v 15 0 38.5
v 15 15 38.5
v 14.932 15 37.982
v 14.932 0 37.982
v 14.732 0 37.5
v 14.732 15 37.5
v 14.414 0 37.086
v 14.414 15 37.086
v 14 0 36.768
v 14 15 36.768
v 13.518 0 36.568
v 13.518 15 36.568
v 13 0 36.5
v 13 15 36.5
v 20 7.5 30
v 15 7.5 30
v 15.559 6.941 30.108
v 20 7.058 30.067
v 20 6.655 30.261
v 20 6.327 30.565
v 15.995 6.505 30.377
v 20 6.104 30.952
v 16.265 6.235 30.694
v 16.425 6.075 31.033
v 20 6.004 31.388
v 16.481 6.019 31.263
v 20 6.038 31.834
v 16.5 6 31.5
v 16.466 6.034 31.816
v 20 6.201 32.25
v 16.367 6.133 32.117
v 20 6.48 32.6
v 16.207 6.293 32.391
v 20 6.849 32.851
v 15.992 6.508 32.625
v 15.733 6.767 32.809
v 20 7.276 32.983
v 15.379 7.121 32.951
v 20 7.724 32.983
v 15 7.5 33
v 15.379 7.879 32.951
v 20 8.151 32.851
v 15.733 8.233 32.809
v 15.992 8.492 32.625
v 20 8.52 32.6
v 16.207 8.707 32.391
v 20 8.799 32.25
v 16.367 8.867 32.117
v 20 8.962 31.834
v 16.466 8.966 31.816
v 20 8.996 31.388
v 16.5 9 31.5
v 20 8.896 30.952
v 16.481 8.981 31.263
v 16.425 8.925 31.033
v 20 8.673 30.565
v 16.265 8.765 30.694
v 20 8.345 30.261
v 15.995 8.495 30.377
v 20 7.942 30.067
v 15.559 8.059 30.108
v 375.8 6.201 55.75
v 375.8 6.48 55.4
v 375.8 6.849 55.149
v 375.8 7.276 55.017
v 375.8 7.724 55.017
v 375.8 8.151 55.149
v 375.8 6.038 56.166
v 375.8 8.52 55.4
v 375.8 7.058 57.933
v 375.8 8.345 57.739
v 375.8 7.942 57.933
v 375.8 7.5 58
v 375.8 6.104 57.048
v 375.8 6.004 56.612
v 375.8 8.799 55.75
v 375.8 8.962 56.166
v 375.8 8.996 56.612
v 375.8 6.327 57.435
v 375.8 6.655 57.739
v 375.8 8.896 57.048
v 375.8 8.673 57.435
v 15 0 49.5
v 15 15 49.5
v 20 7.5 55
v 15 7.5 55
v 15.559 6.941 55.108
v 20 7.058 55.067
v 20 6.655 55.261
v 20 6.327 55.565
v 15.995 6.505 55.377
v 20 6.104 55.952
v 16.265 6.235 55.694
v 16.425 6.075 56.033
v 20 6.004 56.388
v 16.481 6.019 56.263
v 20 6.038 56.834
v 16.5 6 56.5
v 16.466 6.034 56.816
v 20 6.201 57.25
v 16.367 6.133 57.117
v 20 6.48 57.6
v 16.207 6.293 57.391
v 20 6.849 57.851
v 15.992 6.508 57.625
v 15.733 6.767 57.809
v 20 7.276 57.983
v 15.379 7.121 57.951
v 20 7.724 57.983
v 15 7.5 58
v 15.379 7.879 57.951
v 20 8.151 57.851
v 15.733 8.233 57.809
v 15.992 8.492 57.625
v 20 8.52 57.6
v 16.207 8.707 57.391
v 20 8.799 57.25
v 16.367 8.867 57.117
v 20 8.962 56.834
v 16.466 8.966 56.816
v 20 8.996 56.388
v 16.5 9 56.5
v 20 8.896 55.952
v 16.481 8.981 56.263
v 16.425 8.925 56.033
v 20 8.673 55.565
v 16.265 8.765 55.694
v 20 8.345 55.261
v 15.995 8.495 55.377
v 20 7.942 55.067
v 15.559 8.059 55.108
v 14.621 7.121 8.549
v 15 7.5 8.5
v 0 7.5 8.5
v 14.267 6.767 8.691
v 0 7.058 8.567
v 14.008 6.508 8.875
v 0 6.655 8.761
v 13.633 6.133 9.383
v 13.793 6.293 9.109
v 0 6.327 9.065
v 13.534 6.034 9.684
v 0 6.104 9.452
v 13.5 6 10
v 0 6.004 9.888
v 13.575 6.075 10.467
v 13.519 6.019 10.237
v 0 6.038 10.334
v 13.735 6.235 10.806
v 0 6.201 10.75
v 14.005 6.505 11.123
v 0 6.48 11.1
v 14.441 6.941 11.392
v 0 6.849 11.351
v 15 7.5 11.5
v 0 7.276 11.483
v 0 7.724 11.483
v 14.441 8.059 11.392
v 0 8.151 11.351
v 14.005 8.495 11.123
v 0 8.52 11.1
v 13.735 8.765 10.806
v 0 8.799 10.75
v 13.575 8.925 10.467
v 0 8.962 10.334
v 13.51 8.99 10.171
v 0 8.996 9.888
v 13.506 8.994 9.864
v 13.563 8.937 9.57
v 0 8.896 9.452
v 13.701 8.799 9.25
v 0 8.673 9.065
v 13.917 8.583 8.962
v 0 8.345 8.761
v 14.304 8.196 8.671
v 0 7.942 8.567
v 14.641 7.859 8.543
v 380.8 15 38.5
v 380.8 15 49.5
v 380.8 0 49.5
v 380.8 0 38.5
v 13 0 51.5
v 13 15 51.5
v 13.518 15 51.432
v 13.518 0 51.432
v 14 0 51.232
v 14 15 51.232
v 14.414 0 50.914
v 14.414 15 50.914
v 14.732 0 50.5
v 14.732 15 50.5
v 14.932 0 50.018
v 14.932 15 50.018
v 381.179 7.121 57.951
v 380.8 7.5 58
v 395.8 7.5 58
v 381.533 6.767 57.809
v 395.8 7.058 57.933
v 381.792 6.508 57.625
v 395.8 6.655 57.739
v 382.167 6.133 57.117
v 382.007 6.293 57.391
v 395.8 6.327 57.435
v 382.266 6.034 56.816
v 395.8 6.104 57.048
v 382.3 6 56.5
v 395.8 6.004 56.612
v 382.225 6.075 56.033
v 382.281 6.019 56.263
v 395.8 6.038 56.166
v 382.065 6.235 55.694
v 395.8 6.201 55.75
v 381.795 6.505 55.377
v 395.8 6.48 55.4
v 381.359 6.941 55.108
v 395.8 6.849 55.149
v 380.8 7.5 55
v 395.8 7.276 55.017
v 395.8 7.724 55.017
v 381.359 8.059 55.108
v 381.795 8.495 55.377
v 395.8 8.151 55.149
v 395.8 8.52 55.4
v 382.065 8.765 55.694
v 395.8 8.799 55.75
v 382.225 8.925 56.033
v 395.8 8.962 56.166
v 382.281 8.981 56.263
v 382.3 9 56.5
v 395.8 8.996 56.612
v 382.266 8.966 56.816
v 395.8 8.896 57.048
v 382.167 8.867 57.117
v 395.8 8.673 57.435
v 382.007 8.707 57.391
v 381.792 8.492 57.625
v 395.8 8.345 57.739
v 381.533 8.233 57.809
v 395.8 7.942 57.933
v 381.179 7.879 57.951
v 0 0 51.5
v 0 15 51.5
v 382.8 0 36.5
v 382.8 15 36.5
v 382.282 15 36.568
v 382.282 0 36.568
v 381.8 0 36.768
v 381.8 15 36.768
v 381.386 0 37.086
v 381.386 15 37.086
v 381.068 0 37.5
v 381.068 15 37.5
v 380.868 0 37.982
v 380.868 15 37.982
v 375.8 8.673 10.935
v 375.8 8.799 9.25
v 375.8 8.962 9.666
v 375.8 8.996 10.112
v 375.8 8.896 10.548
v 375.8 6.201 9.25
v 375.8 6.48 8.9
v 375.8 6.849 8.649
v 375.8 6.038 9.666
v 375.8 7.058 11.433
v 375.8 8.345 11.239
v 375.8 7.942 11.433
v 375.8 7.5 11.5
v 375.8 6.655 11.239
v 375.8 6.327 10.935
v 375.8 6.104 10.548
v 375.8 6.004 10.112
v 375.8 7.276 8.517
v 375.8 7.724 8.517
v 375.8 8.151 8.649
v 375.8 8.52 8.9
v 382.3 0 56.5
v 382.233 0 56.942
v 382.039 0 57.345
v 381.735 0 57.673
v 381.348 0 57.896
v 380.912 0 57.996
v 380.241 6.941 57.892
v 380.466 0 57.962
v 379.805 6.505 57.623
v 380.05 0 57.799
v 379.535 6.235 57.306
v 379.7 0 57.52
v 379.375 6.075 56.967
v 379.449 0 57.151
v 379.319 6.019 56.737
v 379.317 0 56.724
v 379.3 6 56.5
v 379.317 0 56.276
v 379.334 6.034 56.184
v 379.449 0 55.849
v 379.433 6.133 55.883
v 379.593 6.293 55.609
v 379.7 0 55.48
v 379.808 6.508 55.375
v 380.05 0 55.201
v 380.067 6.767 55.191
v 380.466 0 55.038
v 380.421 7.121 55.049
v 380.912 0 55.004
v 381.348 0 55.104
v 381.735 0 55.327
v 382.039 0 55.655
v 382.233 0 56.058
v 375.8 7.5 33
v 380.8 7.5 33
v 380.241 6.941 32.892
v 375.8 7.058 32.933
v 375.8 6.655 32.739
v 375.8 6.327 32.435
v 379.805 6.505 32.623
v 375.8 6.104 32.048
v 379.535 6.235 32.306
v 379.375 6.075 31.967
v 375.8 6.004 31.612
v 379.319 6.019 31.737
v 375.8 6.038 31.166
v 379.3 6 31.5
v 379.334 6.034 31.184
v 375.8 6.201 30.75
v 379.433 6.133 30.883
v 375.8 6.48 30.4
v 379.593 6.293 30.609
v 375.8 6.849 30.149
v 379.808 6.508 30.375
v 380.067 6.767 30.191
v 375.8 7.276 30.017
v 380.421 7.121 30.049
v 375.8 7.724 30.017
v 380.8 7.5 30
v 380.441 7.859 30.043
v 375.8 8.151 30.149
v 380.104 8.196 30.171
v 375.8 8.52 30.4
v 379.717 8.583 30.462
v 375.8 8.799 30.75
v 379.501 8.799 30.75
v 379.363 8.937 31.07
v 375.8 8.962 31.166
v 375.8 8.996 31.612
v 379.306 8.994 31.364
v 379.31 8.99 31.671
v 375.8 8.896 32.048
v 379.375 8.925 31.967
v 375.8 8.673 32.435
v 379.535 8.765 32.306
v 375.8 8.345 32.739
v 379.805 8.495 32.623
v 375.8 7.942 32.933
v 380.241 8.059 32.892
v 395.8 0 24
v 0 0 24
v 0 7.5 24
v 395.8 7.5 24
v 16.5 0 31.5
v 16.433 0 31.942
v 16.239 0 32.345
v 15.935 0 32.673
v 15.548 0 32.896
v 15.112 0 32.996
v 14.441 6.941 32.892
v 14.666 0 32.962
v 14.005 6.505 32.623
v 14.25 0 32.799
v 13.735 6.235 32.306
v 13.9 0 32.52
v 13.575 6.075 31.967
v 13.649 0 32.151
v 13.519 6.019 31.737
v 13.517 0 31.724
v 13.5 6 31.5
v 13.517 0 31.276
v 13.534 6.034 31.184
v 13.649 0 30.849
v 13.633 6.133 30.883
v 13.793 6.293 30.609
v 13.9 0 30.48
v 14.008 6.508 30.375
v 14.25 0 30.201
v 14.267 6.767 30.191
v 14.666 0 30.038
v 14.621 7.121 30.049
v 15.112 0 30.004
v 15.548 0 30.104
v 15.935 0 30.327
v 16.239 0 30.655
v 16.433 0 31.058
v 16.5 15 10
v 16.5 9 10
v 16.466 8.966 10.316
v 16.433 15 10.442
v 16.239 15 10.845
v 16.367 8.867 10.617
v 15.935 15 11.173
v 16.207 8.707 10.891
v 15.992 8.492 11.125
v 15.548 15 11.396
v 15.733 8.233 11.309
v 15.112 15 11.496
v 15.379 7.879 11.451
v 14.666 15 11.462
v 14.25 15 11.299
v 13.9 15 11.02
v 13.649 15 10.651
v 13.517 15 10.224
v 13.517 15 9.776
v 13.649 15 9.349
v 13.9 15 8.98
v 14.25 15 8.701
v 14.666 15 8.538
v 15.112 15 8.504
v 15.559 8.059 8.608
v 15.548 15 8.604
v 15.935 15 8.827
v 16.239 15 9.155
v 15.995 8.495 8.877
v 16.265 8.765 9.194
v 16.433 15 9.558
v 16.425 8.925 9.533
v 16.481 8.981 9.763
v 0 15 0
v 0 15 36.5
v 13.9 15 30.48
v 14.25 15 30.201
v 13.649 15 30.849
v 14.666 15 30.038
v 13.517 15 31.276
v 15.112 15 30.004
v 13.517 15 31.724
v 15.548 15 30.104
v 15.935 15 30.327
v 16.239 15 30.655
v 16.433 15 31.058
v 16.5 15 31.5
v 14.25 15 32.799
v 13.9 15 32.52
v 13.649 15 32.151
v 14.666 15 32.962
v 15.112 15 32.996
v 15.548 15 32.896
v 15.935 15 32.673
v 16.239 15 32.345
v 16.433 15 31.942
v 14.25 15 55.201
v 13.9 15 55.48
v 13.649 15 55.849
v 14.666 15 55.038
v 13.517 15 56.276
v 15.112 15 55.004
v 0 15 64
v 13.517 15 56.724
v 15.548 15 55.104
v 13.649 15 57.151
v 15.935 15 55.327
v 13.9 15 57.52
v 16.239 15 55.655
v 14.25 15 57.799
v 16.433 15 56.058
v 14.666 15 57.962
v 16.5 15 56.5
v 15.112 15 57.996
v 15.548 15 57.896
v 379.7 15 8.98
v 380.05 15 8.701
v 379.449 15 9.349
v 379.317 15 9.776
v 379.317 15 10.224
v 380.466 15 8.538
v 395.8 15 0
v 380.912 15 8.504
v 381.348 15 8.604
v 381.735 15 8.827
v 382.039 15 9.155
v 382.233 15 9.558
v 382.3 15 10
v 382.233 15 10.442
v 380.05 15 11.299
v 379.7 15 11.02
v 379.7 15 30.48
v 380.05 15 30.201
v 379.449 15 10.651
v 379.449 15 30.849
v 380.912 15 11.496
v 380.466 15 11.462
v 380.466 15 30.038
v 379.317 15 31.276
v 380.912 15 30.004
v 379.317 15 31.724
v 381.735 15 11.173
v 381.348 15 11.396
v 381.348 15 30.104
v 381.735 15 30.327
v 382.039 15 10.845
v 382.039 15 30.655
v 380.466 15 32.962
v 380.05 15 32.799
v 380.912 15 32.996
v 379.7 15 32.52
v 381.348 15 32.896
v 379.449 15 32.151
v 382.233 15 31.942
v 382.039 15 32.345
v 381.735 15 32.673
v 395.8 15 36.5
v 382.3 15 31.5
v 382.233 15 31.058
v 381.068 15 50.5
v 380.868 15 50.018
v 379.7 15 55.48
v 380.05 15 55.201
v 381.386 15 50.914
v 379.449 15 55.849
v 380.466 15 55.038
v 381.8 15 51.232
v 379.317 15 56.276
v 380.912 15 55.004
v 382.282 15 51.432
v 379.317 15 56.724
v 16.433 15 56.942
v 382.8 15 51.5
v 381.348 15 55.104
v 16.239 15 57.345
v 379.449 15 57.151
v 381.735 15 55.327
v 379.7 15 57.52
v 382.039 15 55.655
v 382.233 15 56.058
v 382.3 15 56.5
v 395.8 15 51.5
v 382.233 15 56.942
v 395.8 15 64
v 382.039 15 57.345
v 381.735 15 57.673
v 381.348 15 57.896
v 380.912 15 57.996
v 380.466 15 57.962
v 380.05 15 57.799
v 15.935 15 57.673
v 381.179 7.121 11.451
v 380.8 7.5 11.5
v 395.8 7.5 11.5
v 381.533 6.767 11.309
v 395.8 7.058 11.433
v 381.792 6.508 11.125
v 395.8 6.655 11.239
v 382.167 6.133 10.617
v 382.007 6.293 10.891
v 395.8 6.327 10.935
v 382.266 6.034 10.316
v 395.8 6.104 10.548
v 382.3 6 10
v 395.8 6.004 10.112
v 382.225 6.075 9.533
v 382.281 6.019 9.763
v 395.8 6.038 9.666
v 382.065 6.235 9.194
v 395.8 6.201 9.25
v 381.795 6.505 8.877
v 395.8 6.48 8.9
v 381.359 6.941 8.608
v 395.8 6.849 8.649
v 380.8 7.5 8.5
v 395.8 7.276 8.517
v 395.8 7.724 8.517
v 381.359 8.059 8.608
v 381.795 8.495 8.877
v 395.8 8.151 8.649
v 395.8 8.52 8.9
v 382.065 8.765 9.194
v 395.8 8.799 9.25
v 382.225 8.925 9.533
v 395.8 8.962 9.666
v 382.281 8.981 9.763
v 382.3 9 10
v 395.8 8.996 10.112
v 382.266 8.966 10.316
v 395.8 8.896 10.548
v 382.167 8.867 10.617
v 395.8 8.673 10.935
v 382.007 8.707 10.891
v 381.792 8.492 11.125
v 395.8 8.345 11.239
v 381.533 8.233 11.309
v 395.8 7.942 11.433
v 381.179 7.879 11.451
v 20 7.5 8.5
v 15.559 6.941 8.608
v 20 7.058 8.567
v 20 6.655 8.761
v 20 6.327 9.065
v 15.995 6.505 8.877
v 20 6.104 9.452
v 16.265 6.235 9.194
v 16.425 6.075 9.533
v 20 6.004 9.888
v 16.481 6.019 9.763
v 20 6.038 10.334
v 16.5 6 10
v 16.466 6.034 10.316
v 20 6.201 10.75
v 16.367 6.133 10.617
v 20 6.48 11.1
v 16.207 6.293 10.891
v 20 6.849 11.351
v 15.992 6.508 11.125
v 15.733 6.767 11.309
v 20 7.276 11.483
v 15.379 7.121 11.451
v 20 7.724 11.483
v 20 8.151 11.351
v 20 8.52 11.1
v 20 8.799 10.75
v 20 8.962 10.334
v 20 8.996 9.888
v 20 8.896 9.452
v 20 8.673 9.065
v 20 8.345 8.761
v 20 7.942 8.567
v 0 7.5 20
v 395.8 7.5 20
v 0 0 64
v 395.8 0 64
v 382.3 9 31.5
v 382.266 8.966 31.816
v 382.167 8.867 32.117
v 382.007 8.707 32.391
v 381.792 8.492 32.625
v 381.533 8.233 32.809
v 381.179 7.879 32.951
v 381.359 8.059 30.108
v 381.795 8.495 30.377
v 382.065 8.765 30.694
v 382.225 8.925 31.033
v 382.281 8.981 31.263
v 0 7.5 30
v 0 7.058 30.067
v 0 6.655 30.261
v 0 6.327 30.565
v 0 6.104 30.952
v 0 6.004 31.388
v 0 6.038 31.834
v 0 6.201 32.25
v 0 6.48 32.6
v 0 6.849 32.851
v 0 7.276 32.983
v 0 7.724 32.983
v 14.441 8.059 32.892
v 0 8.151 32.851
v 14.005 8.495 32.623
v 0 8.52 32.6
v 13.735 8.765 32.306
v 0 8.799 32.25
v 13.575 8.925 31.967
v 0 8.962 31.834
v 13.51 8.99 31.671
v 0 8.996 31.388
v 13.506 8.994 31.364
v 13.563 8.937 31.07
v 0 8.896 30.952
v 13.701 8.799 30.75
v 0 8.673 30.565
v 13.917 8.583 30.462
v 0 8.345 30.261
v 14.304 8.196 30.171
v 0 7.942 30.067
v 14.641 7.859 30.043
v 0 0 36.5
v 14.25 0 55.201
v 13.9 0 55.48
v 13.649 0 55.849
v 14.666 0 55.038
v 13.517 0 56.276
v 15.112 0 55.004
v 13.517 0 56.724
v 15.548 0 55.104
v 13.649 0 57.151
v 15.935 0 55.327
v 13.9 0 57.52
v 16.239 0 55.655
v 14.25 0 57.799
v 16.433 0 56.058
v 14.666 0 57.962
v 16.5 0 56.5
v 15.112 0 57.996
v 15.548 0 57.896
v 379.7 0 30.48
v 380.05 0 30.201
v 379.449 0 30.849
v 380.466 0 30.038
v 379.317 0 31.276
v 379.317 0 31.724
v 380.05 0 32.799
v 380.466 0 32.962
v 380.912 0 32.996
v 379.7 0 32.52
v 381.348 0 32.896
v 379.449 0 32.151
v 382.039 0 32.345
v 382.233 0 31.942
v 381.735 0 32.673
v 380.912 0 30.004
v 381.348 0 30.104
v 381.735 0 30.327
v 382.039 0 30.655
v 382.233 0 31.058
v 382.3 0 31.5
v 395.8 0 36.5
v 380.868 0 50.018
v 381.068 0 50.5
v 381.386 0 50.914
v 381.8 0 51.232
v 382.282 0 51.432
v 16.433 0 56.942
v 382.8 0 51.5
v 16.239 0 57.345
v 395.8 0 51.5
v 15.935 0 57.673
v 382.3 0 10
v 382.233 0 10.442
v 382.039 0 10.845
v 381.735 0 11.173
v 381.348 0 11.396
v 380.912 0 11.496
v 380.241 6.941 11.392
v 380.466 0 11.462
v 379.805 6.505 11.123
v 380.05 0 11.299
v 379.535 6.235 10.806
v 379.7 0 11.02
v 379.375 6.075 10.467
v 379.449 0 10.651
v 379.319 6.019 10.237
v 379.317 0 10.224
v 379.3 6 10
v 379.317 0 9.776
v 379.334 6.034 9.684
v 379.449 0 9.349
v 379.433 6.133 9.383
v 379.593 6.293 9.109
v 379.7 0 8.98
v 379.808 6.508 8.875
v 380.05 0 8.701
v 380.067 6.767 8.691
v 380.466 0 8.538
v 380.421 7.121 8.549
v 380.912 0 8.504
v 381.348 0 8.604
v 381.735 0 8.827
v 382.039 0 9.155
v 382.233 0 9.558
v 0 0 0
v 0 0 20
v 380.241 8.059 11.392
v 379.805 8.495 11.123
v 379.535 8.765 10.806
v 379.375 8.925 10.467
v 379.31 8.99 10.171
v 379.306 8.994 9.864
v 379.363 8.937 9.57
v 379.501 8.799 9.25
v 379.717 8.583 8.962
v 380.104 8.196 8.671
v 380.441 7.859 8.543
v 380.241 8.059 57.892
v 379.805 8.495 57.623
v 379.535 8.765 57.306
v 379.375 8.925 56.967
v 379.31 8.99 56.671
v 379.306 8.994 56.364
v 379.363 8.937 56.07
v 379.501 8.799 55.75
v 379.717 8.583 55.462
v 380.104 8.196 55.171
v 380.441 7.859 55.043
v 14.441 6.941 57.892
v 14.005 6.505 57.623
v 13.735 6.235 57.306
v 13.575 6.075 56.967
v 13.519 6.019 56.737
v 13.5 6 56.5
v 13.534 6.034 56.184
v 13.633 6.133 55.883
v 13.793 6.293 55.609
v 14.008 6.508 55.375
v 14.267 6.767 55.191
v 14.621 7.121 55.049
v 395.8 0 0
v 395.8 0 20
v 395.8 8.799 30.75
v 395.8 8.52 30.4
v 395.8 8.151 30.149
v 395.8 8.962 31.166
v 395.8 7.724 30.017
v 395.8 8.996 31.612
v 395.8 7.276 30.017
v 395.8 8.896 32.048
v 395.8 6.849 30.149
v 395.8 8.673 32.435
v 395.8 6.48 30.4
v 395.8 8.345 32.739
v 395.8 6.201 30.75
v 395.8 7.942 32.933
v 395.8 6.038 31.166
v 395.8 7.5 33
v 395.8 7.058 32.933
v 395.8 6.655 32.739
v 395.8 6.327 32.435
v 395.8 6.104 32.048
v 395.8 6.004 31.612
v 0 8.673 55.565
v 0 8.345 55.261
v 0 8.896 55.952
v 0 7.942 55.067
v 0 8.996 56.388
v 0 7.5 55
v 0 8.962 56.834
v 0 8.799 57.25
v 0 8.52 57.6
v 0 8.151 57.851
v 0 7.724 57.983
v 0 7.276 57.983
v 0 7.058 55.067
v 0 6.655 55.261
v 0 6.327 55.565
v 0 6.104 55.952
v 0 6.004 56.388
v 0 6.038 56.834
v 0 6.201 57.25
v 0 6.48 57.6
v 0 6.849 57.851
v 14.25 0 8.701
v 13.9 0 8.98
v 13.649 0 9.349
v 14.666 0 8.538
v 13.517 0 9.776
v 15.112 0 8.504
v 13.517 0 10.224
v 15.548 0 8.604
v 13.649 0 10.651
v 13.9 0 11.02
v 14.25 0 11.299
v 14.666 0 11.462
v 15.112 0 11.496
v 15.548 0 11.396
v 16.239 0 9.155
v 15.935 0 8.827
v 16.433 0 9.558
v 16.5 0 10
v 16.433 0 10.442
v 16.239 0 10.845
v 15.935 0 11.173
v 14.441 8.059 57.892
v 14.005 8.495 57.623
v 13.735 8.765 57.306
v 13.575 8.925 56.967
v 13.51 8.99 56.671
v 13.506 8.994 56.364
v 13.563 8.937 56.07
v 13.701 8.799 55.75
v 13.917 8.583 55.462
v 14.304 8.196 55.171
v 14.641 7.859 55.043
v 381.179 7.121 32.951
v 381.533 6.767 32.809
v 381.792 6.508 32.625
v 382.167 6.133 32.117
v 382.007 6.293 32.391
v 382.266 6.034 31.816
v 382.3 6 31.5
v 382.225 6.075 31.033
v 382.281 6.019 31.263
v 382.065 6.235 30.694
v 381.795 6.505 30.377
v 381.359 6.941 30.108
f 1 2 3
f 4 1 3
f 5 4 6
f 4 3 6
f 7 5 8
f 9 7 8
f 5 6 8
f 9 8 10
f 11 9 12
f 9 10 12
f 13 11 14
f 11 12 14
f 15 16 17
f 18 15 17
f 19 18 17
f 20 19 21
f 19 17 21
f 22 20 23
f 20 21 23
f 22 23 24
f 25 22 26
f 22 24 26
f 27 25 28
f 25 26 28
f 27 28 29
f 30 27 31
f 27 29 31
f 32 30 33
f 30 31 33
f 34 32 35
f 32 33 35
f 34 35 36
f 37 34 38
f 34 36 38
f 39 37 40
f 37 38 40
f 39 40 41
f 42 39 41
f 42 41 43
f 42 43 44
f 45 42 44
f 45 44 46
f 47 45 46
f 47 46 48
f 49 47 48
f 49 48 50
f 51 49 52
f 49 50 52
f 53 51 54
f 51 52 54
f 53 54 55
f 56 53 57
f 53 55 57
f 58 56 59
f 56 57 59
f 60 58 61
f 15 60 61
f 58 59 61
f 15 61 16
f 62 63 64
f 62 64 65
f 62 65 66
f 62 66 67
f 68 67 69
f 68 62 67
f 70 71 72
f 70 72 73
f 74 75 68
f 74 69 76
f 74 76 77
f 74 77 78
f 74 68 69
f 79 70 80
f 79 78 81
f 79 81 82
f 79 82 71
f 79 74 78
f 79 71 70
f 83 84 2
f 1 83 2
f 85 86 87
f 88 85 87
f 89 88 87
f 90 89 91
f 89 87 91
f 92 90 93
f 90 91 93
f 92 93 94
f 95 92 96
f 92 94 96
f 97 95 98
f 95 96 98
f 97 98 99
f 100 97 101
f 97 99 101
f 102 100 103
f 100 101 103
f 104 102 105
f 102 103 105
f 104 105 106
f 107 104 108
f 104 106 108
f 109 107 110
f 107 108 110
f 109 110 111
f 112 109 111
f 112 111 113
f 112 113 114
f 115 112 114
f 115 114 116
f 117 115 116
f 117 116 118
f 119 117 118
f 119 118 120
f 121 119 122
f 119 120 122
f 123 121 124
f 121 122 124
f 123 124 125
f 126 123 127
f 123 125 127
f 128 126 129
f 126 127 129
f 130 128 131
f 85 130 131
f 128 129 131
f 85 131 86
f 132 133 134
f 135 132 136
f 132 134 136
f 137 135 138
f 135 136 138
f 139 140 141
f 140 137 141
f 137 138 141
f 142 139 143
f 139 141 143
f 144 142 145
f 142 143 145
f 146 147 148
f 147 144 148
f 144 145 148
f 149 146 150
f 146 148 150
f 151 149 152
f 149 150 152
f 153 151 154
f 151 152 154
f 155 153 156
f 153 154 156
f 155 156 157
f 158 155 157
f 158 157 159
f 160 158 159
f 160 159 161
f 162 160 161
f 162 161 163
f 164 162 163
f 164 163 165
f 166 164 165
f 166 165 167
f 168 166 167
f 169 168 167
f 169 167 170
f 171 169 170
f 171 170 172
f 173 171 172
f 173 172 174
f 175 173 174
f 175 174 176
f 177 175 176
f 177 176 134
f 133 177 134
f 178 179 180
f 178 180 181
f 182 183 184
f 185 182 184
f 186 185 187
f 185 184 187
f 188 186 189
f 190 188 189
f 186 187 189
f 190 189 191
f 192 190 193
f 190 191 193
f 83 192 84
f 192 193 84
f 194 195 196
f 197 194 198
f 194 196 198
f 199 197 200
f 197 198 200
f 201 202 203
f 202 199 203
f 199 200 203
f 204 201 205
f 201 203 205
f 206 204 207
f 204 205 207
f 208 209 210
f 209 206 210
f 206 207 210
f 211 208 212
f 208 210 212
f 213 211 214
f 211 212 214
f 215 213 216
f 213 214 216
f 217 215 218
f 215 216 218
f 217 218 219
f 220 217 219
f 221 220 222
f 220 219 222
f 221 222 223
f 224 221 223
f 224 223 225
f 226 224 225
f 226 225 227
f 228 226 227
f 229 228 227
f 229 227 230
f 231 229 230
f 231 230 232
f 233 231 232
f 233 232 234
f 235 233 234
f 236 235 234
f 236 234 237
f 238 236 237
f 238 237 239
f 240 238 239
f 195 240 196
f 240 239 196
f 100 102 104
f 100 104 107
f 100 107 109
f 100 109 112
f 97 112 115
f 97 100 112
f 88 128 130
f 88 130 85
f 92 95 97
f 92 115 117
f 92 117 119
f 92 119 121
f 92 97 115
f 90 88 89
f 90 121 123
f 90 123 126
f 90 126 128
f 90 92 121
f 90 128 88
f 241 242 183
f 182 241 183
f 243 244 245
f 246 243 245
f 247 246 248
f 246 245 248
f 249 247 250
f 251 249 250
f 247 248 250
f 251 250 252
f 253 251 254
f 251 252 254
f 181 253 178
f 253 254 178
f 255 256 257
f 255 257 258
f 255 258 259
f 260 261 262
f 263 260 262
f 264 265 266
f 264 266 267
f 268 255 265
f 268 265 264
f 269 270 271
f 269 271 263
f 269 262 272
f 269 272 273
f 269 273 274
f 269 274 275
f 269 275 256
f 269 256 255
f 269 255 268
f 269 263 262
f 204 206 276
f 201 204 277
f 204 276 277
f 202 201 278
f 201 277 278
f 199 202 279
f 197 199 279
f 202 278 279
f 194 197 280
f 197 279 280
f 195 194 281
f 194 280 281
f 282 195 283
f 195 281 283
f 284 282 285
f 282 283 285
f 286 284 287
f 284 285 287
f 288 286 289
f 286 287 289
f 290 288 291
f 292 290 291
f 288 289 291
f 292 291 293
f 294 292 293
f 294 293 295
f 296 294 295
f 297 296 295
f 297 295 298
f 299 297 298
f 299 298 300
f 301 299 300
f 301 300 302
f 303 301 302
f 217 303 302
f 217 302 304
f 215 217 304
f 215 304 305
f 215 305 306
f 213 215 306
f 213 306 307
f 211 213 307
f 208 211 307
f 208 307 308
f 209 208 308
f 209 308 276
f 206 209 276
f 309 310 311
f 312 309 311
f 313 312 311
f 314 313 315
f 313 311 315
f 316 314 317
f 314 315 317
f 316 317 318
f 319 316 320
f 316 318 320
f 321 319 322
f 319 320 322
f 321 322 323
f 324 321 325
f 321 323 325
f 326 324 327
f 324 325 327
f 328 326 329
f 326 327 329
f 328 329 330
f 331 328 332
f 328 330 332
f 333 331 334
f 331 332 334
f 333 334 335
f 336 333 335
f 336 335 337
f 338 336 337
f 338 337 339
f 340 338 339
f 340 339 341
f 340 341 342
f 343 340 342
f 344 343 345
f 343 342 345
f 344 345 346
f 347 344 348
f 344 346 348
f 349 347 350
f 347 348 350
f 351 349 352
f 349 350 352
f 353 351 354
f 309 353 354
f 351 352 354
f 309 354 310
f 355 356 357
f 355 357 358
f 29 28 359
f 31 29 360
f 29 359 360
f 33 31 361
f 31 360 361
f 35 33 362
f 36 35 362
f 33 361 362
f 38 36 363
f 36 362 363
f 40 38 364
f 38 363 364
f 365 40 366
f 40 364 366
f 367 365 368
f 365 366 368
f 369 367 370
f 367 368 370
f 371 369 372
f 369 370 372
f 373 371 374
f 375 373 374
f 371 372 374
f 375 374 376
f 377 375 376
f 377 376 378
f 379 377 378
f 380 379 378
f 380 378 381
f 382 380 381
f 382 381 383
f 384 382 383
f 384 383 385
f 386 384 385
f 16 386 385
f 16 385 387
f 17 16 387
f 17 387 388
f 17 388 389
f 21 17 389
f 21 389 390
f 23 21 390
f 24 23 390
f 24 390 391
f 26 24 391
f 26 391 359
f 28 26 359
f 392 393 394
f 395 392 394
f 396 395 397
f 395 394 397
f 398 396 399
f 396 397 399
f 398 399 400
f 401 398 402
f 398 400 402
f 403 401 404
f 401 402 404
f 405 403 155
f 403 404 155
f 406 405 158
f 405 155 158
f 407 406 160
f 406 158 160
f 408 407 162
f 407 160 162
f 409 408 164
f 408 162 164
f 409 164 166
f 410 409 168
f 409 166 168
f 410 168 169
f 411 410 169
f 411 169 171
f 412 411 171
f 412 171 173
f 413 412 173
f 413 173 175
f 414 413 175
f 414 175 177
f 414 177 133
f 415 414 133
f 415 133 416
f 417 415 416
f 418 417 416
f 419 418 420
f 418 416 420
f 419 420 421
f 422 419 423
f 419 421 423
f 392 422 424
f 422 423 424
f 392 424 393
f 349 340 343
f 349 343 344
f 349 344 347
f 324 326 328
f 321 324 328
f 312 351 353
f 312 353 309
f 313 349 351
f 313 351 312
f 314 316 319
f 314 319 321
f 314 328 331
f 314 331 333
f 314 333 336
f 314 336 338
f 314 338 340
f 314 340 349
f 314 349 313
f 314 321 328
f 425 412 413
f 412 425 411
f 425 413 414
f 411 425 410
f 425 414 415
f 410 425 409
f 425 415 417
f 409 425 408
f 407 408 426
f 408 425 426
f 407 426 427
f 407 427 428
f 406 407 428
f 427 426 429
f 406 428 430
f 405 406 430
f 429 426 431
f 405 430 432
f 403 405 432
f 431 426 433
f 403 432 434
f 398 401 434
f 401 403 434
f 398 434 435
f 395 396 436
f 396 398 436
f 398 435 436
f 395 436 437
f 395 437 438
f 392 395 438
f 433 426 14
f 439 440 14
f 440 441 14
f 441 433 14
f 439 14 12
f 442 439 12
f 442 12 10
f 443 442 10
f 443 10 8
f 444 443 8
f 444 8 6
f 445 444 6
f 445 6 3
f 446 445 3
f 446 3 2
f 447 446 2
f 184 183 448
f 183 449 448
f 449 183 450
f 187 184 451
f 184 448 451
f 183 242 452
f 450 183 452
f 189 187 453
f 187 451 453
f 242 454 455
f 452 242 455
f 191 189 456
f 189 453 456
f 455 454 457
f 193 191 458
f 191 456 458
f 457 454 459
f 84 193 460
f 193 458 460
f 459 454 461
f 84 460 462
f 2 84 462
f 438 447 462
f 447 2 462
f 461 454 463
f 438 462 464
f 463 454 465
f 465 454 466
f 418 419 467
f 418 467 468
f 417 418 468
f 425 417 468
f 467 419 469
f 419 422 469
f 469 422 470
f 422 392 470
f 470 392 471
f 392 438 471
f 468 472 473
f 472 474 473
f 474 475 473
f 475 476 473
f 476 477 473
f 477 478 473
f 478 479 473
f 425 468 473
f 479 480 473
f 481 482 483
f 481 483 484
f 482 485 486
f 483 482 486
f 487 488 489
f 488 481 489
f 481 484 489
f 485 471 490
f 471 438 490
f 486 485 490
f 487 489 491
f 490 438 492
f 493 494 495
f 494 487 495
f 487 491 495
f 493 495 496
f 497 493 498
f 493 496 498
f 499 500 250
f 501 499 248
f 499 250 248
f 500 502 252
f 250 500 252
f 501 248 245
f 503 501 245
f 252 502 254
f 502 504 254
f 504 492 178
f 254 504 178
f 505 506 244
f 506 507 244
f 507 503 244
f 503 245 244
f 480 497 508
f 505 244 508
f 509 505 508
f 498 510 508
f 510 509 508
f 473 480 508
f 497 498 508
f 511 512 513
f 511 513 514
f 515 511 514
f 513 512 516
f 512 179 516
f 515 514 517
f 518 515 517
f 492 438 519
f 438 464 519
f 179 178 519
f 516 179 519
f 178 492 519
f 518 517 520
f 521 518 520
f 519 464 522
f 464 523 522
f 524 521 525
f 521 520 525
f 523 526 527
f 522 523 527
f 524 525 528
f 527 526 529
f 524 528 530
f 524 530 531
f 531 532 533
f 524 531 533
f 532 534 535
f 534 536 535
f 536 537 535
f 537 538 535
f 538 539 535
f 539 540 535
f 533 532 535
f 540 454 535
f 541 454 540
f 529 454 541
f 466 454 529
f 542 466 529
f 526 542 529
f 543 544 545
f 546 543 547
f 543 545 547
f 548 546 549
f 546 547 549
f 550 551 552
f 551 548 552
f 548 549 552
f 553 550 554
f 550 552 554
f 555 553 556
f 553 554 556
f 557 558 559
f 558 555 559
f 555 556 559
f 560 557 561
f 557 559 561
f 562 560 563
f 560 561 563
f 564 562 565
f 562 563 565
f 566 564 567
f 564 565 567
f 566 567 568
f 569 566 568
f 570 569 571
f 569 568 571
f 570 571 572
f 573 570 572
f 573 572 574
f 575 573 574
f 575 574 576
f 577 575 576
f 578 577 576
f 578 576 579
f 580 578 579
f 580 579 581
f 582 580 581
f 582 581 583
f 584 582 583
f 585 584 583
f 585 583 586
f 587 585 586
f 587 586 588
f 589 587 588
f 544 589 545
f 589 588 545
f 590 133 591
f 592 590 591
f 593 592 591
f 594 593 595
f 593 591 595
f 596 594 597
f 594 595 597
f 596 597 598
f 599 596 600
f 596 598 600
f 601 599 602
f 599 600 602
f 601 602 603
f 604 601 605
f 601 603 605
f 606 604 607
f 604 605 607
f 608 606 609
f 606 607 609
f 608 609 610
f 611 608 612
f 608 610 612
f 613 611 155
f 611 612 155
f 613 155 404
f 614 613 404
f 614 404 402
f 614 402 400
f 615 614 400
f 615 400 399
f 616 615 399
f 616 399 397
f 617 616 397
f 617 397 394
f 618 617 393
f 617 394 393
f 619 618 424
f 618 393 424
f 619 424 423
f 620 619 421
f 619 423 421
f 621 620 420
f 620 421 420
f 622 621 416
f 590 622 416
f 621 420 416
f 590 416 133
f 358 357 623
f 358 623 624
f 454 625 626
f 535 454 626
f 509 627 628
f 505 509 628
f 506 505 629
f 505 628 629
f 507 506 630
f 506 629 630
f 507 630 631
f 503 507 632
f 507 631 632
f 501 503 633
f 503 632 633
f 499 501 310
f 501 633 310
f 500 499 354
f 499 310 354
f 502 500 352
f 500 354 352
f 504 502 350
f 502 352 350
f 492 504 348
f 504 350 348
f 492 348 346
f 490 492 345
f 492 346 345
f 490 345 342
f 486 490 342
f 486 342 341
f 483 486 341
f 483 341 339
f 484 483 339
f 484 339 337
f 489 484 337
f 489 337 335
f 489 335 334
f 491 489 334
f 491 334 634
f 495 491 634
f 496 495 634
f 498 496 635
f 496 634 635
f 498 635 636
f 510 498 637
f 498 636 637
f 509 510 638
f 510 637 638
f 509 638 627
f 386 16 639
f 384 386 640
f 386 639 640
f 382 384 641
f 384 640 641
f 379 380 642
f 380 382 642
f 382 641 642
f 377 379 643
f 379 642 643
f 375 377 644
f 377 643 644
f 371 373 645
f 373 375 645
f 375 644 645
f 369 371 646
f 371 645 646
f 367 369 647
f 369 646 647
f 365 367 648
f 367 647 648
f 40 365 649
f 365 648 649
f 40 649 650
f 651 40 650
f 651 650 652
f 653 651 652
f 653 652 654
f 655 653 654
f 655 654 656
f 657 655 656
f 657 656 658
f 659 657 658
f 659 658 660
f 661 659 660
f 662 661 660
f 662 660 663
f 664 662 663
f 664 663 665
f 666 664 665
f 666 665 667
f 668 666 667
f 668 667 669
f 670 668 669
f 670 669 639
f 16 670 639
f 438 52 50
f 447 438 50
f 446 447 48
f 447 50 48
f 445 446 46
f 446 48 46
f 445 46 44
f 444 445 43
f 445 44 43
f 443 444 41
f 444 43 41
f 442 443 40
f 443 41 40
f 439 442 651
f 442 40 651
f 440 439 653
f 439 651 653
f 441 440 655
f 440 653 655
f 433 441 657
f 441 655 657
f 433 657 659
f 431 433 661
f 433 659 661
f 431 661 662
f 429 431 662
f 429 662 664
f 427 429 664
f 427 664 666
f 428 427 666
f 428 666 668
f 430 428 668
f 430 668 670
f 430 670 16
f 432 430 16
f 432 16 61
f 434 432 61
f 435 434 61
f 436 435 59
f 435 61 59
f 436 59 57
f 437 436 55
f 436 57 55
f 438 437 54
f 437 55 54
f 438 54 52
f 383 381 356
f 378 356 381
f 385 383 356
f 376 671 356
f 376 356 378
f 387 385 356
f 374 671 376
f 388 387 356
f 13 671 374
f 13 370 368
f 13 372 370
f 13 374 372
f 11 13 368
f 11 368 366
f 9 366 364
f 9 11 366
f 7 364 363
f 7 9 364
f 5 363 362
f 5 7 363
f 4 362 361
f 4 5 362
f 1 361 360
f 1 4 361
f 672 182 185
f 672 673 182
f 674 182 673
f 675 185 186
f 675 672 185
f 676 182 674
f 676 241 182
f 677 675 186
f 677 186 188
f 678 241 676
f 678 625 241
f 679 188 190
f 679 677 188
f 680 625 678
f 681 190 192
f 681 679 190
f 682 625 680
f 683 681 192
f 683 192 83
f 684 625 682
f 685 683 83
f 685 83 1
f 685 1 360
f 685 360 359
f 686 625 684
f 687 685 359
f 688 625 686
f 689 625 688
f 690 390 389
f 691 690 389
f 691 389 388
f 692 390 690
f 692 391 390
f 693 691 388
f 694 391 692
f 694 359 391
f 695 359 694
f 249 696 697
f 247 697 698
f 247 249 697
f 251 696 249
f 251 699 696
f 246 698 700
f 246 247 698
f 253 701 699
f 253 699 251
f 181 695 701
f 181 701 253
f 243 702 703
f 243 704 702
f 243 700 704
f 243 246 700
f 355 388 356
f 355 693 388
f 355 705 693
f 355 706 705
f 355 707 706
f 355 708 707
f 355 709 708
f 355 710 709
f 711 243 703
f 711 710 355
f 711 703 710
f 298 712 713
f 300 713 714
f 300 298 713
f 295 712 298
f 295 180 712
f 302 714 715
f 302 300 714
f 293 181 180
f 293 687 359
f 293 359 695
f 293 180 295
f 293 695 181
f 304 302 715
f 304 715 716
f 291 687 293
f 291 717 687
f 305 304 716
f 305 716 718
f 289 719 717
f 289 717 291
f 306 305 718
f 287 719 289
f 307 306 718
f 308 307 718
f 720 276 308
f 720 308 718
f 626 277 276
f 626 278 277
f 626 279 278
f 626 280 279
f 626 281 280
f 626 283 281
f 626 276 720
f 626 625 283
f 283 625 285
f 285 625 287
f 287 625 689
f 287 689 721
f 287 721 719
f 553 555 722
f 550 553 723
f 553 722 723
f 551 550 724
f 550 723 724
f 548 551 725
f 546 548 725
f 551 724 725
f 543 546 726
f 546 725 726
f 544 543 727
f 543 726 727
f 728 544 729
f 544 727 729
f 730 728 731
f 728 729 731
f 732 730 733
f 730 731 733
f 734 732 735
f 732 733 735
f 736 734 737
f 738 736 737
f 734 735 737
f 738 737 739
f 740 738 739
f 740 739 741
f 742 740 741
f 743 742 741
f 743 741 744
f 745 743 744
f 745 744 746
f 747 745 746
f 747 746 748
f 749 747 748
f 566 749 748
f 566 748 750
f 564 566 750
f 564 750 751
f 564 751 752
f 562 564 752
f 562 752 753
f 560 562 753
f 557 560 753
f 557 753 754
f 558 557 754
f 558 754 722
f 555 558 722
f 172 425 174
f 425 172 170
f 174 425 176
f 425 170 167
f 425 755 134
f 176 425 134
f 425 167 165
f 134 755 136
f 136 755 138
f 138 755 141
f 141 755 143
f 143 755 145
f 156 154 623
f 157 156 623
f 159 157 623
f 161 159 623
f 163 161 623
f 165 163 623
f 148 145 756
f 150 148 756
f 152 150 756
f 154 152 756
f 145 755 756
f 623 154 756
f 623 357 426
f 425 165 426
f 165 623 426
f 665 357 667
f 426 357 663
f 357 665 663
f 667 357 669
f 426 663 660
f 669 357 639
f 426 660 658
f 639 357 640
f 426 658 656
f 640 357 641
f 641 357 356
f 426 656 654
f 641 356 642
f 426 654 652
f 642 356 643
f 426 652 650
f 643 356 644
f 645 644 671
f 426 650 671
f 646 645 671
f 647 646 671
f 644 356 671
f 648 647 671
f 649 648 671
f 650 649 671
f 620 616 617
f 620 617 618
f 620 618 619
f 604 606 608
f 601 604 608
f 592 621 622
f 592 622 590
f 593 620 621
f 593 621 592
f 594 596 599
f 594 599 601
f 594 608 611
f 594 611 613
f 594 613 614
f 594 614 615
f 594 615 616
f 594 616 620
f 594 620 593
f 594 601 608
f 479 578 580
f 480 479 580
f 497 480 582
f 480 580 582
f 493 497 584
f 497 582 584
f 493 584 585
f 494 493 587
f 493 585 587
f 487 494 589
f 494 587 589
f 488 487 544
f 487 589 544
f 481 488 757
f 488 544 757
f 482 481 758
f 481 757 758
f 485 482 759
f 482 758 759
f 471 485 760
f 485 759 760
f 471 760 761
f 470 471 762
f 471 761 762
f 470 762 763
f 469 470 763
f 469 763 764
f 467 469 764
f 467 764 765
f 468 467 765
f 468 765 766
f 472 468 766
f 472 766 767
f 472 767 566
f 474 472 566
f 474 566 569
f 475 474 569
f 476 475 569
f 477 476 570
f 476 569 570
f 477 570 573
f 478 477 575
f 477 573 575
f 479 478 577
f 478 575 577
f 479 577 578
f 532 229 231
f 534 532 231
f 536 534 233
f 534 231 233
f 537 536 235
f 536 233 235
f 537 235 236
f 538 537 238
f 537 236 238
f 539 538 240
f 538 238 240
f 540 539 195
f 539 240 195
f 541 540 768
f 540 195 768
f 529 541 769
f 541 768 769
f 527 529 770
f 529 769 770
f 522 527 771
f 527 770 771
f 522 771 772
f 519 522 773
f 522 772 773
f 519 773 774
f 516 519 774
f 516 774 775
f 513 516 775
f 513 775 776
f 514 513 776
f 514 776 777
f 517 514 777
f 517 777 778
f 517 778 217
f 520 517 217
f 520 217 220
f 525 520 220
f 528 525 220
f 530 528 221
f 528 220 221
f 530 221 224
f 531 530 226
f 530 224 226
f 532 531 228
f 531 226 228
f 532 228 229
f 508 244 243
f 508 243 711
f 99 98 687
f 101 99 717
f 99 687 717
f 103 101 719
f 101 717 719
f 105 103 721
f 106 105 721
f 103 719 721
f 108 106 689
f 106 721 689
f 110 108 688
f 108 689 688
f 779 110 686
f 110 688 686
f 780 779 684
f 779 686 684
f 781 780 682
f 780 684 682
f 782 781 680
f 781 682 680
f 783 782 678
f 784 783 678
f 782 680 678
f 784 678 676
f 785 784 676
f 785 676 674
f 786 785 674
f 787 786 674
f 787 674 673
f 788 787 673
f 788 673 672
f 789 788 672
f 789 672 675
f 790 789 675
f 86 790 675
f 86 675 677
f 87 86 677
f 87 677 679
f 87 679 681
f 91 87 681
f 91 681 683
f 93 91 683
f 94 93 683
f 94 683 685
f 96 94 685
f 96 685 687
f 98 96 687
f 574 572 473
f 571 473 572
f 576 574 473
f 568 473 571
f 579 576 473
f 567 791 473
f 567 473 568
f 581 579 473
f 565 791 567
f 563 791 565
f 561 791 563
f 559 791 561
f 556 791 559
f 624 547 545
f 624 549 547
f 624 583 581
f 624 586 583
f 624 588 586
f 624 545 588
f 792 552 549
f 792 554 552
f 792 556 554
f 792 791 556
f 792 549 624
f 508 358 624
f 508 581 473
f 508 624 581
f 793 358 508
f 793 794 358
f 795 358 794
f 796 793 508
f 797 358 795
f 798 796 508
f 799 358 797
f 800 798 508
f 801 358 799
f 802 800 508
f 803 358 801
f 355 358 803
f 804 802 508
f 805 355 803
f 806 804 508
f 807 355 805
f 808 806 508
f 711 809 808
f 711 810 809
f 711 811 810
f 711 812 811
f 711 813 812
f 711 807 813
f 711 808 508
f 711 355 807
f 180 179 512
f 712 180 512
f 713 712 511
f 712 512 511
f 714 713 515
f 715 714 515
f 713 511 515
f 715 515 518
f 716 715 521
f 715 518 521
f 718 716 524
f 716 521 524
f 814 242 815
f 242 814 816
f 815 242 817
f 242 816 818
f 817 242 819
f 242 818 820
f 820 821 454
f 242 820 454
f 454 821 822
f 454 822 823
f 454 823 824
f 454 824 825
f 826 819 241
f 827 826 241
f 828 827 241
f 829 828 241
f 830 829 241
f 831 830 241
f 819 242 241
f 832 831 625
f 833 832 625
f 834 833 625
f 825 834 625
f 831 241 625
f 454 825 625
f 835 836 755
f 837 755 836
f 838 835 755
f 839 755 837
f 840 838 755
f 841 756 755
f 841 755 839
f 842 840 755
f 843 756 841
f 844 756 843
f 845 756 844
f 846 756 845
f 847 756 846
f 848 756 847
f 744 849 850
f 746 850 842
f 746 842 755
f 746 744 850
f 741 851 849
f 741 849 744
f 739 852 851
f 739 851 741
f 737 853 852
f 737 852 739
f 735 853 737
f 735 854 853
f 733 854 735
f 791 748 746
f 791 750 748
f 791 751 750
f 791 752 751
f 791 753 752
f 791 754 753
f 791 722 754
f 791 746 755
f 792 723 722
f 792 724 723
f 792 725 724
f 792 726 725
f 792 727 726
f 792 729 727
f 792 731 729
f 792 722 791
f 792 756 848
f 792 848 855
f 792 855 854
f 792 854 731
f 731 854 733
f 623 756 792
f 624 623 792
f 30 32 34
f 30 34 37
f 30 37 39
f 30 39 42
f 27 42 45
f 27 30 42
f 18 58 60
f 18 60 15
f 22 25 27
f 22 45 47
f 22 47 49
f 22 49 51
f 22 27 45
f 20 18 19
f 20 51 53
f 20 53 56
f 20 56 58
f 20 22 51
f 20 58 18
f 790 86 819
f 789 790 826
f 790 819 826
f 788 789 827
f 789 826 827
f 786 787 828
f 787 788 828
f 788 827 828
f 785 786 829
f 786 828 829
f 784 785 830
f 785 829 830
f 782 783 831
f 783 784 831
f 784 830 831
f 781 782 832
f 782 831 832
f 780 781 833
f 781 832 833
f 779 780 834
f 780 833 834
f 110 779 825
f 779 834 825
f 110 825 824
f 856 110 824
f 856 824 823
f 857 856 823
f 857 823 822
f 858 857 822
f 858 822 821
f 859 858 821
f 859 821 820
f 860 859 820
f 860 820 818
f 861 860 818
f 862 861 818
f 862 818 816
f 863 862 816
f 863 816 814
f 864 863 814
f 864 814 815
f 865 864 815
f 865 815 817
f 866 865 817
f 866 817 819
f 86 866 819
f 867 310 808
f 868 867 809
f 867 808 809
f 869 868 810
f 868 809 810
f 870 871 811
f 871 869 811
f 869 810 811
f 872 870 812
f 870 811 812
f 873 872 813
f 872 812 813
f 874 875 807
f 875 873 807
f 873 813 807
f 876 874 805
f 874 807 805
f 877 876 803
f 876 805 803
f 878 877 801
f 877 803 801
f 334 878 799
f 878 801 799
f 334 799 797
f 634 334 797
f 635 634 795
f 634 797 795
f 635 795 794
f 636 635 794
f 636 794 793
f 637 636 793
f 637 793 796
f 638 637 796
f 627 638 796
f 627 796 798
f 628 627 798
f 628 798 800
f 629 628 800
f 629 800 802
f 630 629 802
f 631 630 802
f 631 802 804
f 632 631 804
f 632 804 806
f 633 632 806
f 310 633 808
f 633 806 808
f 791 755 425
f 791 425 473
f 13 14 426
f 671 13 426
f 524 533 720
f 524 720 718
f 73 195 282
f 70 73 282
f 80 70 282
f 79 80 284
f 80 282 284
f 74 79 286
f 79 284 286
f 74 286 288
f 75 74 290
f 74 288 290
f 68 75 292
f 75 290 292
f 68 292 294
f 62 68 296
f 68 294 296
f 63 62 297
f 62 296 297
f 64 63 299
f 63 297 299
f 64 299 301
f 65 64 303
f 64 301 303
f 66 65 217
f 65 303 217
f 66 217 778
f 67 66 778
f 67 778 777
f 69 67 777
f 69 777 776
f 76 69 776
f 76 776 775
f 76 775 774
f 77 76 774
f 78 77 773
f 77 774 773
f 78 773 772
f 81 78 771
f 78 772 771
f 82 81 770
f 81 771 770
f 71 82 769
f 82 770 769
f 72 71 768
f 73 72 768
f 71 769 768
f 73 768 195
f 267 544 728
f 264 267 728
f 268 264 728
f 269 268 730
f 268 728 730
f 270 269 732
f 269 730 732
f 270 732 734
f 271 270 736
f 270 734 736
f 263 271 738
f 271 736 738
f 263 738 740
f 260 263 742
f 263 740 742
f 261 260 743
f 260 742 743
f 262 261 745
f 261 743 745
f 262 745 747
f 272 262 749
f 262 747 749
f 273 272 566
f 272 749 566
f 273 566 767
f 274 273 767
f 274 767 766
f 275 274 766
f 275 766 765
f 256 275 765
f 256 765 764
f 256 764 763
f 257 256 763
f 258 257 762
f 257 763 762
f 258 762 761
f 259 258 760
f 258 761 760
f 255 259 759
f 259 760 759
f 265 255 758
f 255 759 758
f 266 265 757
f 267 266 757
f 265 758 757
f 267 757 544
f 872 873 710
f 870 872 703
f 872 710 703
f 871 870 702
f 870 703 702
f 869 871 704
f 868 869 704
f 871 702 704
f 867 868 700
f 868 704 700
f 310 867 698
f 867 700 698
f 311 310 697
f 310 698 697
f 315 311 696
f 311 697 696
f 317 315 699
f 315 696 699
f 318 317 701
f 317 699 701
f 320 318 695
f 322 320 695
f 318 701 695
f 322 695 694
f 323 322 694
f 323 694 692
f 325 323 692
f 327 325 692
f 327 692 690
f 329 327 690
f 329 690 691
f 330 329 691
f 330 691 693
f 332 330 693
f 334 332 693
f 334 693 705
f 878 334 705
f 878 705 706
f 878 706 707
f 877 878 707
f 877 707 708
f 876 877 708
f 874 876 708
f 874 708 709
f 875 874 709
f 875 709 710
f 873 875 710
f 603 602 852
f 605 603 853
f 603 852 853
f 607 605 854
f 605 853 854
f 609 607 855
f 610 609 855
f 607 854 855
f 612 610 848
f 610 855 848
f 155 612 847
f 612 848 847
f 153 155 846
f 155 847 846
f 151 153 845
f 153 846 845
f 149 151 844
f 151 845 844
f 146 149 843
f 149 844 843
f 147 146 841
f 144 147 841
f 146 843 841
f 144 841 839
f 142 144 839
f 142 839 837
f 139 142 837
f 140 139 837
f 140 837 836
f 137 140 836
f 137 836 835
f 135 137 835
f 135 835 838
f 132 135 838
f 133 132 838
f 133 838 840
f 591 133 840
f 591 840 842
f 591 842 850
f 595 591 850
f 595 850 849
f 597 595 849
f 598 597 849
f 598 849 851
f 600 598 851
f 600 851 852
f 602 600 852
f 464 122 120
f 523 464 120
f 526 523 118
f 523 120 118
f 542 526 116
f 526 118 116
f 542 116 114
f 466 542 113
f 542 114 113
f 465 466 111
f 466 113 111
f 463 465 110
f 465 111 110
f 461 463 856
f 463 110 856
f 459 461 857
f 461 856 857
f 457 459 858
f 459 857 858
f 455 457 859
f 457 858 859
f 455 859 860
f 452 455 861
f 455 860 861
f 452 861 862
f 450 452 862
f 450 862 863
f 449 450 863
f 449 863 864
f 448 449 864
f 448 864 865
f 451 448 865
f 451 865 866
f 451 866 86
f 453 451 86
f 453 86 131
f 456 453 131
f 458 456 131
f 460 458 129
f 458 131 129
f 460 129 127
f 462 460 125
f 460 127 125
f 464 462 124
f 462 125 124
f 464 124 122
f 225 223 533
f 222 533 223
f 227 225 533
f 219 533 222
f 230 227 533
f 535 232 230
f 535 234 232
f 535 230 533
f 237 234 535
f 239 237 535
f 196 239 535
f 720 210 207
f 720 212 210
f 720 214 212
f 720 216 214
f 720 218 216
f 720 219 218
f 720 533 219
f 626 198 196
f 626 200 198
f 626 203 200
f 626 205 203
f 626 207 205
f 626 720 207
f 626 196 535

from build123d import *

# Parameters (mm, degrees)
SKETCH_W        = 395.8
SKETCH_H        = 64
PAD_DEPTH       = 15
SKETCH001_R     = 1.5
POCKET_DEPTH    = 15.001
SKETCH002_W     = 395.8
SKETCH002_H     = 4
POCKET001_DEPTH = 7.5
SKETCH003_R     = 1.5
POCKET002_DEPTH = 20
SKETCH004_R     = 1.5
POCKET003_DEPTH = 20
POCKET004_DEPTH = 15.001


with BuildPart() as part:
    # Sketch → Pad (new body)
    with BuildSketch(Plane.XZ):
        with Locations((197.9, 32)):
            Rectangle(SKETCH_W, SKETCH_H)
    extrude(amount=-PAD_DEPTH)

    # Sketch001 (on Face5 of Pad) → Pocket (cut, through all)
    with BuildSketch(Plane.XZ):
        with Locations((15, 56.5)):
            Circle(SKETCH001_R)
        with Locations((15, 31.5)):
            Circle(SKETCH001_R)
        with Locations((380.8, 31.5)):
            Circle(SKETCH001_R)
        with Locations((380.8, 56.5)):
            Circle(SKETCH001_R)
        with Locations((15, 10)):
            Circle(SKETCH001_R)
        with Locations((380.8, 10)):
            Circle(SKETCH001_R)
    extrude(amount=-POCKET_DEPTH, mode=Mode.SUBTRACT)

    # Sketch002 (on Face4 of Pocket) → Pocket001 (cut)
    with BuildSketch(Plane.XZ):
        with Locations((197.9, 22)):
            Rectangle(SKETCH002_W, SKETCH002_H)
    extrude(amount=-POCKET001_DEPTH, mode=Mode.SUBTRACT)

    # Sketch003 (on Face3 of Pocket001) → Pocket002 (cut)
    with BuildSketch(Plane(origin=(395.8, 0, 0), x_dir=(0, 0, 1), z_dir=(1, 0, 0))):
        with Locations((10, -7.5)):
            Circle(SKETCH003_R)
        with Locations((31.5, -7.5)):
            Circle(SKETCH003_R)
        with Locations((56.5, -7.5)):
            Circle(SKETCH003_R)
    extrude(amount=-POCKET002_DEPTH, mode=Mode.SUBTRACT)

    # Sketch004 (on Face2 of Pocket002) → Pocket003 (cut)
    with BuildSketch(Plane(origin=(0, 0, 0), x_dir=(0, 0, -1), z_dir=(-1, 0, 0))):
        with Locations((-56.5, -7.5)):
            Circle(SKETCH004_R)
        with Locations((-31.5, -7.5)):
            Circle(SKETCH004_R)
        with Locations((-10, -7.5)):
            Circle(SKETCH004_R)
    extrude(amount=-POCKET003_DEPTH, mode=Mode.SUBTRACT)

    # Sketch005 (on Face5 of Pocket003) → Pocket004 (cut, through all)
    with BuildSketch(Plane(origin=(0, 15, 0), x_dir=(1, 0, 0), z_dir=(0, 1, 0))):
        with BuildLine():
            Line((0, -51.5), (13, -51.5))
            ThreePointArc((13, -51.5), (14.414214, -50.914214), (15, -49.5))
            Line((15, -49.5), (15, -38.5))
            ThreePointArc((15, -38.5), (14.414214, -37.085786), (13, -36.5))
            Line((13, -36.5), (0, -36.5))
            Line((0, -36.5), (0, -51.5))
        make_face()
        with BuildLine():
            Line((395.8, -51.5), (382.8, -51.5))
            ThreePointArc((380.8, -49.5), (381.385786, -50.914214), (382.8, -51.5))
            Line((380.8, -49.5), (380.8, -38.5))
            ThreePointArc((382.8, -36.5), (381.385786, -37.085786), (380.8, -38.5))
            Line((382.8, -36.5), (395.8, -36.5))
            Line((395.8, -36.5), (395.8, -44))
            Line((395.8, -44), (395.8, -51.5))
        make_face()
    extrude(amount=-POCKET004_DEPTH, mode=Mode.SUBTRACT)


solid = part.part
